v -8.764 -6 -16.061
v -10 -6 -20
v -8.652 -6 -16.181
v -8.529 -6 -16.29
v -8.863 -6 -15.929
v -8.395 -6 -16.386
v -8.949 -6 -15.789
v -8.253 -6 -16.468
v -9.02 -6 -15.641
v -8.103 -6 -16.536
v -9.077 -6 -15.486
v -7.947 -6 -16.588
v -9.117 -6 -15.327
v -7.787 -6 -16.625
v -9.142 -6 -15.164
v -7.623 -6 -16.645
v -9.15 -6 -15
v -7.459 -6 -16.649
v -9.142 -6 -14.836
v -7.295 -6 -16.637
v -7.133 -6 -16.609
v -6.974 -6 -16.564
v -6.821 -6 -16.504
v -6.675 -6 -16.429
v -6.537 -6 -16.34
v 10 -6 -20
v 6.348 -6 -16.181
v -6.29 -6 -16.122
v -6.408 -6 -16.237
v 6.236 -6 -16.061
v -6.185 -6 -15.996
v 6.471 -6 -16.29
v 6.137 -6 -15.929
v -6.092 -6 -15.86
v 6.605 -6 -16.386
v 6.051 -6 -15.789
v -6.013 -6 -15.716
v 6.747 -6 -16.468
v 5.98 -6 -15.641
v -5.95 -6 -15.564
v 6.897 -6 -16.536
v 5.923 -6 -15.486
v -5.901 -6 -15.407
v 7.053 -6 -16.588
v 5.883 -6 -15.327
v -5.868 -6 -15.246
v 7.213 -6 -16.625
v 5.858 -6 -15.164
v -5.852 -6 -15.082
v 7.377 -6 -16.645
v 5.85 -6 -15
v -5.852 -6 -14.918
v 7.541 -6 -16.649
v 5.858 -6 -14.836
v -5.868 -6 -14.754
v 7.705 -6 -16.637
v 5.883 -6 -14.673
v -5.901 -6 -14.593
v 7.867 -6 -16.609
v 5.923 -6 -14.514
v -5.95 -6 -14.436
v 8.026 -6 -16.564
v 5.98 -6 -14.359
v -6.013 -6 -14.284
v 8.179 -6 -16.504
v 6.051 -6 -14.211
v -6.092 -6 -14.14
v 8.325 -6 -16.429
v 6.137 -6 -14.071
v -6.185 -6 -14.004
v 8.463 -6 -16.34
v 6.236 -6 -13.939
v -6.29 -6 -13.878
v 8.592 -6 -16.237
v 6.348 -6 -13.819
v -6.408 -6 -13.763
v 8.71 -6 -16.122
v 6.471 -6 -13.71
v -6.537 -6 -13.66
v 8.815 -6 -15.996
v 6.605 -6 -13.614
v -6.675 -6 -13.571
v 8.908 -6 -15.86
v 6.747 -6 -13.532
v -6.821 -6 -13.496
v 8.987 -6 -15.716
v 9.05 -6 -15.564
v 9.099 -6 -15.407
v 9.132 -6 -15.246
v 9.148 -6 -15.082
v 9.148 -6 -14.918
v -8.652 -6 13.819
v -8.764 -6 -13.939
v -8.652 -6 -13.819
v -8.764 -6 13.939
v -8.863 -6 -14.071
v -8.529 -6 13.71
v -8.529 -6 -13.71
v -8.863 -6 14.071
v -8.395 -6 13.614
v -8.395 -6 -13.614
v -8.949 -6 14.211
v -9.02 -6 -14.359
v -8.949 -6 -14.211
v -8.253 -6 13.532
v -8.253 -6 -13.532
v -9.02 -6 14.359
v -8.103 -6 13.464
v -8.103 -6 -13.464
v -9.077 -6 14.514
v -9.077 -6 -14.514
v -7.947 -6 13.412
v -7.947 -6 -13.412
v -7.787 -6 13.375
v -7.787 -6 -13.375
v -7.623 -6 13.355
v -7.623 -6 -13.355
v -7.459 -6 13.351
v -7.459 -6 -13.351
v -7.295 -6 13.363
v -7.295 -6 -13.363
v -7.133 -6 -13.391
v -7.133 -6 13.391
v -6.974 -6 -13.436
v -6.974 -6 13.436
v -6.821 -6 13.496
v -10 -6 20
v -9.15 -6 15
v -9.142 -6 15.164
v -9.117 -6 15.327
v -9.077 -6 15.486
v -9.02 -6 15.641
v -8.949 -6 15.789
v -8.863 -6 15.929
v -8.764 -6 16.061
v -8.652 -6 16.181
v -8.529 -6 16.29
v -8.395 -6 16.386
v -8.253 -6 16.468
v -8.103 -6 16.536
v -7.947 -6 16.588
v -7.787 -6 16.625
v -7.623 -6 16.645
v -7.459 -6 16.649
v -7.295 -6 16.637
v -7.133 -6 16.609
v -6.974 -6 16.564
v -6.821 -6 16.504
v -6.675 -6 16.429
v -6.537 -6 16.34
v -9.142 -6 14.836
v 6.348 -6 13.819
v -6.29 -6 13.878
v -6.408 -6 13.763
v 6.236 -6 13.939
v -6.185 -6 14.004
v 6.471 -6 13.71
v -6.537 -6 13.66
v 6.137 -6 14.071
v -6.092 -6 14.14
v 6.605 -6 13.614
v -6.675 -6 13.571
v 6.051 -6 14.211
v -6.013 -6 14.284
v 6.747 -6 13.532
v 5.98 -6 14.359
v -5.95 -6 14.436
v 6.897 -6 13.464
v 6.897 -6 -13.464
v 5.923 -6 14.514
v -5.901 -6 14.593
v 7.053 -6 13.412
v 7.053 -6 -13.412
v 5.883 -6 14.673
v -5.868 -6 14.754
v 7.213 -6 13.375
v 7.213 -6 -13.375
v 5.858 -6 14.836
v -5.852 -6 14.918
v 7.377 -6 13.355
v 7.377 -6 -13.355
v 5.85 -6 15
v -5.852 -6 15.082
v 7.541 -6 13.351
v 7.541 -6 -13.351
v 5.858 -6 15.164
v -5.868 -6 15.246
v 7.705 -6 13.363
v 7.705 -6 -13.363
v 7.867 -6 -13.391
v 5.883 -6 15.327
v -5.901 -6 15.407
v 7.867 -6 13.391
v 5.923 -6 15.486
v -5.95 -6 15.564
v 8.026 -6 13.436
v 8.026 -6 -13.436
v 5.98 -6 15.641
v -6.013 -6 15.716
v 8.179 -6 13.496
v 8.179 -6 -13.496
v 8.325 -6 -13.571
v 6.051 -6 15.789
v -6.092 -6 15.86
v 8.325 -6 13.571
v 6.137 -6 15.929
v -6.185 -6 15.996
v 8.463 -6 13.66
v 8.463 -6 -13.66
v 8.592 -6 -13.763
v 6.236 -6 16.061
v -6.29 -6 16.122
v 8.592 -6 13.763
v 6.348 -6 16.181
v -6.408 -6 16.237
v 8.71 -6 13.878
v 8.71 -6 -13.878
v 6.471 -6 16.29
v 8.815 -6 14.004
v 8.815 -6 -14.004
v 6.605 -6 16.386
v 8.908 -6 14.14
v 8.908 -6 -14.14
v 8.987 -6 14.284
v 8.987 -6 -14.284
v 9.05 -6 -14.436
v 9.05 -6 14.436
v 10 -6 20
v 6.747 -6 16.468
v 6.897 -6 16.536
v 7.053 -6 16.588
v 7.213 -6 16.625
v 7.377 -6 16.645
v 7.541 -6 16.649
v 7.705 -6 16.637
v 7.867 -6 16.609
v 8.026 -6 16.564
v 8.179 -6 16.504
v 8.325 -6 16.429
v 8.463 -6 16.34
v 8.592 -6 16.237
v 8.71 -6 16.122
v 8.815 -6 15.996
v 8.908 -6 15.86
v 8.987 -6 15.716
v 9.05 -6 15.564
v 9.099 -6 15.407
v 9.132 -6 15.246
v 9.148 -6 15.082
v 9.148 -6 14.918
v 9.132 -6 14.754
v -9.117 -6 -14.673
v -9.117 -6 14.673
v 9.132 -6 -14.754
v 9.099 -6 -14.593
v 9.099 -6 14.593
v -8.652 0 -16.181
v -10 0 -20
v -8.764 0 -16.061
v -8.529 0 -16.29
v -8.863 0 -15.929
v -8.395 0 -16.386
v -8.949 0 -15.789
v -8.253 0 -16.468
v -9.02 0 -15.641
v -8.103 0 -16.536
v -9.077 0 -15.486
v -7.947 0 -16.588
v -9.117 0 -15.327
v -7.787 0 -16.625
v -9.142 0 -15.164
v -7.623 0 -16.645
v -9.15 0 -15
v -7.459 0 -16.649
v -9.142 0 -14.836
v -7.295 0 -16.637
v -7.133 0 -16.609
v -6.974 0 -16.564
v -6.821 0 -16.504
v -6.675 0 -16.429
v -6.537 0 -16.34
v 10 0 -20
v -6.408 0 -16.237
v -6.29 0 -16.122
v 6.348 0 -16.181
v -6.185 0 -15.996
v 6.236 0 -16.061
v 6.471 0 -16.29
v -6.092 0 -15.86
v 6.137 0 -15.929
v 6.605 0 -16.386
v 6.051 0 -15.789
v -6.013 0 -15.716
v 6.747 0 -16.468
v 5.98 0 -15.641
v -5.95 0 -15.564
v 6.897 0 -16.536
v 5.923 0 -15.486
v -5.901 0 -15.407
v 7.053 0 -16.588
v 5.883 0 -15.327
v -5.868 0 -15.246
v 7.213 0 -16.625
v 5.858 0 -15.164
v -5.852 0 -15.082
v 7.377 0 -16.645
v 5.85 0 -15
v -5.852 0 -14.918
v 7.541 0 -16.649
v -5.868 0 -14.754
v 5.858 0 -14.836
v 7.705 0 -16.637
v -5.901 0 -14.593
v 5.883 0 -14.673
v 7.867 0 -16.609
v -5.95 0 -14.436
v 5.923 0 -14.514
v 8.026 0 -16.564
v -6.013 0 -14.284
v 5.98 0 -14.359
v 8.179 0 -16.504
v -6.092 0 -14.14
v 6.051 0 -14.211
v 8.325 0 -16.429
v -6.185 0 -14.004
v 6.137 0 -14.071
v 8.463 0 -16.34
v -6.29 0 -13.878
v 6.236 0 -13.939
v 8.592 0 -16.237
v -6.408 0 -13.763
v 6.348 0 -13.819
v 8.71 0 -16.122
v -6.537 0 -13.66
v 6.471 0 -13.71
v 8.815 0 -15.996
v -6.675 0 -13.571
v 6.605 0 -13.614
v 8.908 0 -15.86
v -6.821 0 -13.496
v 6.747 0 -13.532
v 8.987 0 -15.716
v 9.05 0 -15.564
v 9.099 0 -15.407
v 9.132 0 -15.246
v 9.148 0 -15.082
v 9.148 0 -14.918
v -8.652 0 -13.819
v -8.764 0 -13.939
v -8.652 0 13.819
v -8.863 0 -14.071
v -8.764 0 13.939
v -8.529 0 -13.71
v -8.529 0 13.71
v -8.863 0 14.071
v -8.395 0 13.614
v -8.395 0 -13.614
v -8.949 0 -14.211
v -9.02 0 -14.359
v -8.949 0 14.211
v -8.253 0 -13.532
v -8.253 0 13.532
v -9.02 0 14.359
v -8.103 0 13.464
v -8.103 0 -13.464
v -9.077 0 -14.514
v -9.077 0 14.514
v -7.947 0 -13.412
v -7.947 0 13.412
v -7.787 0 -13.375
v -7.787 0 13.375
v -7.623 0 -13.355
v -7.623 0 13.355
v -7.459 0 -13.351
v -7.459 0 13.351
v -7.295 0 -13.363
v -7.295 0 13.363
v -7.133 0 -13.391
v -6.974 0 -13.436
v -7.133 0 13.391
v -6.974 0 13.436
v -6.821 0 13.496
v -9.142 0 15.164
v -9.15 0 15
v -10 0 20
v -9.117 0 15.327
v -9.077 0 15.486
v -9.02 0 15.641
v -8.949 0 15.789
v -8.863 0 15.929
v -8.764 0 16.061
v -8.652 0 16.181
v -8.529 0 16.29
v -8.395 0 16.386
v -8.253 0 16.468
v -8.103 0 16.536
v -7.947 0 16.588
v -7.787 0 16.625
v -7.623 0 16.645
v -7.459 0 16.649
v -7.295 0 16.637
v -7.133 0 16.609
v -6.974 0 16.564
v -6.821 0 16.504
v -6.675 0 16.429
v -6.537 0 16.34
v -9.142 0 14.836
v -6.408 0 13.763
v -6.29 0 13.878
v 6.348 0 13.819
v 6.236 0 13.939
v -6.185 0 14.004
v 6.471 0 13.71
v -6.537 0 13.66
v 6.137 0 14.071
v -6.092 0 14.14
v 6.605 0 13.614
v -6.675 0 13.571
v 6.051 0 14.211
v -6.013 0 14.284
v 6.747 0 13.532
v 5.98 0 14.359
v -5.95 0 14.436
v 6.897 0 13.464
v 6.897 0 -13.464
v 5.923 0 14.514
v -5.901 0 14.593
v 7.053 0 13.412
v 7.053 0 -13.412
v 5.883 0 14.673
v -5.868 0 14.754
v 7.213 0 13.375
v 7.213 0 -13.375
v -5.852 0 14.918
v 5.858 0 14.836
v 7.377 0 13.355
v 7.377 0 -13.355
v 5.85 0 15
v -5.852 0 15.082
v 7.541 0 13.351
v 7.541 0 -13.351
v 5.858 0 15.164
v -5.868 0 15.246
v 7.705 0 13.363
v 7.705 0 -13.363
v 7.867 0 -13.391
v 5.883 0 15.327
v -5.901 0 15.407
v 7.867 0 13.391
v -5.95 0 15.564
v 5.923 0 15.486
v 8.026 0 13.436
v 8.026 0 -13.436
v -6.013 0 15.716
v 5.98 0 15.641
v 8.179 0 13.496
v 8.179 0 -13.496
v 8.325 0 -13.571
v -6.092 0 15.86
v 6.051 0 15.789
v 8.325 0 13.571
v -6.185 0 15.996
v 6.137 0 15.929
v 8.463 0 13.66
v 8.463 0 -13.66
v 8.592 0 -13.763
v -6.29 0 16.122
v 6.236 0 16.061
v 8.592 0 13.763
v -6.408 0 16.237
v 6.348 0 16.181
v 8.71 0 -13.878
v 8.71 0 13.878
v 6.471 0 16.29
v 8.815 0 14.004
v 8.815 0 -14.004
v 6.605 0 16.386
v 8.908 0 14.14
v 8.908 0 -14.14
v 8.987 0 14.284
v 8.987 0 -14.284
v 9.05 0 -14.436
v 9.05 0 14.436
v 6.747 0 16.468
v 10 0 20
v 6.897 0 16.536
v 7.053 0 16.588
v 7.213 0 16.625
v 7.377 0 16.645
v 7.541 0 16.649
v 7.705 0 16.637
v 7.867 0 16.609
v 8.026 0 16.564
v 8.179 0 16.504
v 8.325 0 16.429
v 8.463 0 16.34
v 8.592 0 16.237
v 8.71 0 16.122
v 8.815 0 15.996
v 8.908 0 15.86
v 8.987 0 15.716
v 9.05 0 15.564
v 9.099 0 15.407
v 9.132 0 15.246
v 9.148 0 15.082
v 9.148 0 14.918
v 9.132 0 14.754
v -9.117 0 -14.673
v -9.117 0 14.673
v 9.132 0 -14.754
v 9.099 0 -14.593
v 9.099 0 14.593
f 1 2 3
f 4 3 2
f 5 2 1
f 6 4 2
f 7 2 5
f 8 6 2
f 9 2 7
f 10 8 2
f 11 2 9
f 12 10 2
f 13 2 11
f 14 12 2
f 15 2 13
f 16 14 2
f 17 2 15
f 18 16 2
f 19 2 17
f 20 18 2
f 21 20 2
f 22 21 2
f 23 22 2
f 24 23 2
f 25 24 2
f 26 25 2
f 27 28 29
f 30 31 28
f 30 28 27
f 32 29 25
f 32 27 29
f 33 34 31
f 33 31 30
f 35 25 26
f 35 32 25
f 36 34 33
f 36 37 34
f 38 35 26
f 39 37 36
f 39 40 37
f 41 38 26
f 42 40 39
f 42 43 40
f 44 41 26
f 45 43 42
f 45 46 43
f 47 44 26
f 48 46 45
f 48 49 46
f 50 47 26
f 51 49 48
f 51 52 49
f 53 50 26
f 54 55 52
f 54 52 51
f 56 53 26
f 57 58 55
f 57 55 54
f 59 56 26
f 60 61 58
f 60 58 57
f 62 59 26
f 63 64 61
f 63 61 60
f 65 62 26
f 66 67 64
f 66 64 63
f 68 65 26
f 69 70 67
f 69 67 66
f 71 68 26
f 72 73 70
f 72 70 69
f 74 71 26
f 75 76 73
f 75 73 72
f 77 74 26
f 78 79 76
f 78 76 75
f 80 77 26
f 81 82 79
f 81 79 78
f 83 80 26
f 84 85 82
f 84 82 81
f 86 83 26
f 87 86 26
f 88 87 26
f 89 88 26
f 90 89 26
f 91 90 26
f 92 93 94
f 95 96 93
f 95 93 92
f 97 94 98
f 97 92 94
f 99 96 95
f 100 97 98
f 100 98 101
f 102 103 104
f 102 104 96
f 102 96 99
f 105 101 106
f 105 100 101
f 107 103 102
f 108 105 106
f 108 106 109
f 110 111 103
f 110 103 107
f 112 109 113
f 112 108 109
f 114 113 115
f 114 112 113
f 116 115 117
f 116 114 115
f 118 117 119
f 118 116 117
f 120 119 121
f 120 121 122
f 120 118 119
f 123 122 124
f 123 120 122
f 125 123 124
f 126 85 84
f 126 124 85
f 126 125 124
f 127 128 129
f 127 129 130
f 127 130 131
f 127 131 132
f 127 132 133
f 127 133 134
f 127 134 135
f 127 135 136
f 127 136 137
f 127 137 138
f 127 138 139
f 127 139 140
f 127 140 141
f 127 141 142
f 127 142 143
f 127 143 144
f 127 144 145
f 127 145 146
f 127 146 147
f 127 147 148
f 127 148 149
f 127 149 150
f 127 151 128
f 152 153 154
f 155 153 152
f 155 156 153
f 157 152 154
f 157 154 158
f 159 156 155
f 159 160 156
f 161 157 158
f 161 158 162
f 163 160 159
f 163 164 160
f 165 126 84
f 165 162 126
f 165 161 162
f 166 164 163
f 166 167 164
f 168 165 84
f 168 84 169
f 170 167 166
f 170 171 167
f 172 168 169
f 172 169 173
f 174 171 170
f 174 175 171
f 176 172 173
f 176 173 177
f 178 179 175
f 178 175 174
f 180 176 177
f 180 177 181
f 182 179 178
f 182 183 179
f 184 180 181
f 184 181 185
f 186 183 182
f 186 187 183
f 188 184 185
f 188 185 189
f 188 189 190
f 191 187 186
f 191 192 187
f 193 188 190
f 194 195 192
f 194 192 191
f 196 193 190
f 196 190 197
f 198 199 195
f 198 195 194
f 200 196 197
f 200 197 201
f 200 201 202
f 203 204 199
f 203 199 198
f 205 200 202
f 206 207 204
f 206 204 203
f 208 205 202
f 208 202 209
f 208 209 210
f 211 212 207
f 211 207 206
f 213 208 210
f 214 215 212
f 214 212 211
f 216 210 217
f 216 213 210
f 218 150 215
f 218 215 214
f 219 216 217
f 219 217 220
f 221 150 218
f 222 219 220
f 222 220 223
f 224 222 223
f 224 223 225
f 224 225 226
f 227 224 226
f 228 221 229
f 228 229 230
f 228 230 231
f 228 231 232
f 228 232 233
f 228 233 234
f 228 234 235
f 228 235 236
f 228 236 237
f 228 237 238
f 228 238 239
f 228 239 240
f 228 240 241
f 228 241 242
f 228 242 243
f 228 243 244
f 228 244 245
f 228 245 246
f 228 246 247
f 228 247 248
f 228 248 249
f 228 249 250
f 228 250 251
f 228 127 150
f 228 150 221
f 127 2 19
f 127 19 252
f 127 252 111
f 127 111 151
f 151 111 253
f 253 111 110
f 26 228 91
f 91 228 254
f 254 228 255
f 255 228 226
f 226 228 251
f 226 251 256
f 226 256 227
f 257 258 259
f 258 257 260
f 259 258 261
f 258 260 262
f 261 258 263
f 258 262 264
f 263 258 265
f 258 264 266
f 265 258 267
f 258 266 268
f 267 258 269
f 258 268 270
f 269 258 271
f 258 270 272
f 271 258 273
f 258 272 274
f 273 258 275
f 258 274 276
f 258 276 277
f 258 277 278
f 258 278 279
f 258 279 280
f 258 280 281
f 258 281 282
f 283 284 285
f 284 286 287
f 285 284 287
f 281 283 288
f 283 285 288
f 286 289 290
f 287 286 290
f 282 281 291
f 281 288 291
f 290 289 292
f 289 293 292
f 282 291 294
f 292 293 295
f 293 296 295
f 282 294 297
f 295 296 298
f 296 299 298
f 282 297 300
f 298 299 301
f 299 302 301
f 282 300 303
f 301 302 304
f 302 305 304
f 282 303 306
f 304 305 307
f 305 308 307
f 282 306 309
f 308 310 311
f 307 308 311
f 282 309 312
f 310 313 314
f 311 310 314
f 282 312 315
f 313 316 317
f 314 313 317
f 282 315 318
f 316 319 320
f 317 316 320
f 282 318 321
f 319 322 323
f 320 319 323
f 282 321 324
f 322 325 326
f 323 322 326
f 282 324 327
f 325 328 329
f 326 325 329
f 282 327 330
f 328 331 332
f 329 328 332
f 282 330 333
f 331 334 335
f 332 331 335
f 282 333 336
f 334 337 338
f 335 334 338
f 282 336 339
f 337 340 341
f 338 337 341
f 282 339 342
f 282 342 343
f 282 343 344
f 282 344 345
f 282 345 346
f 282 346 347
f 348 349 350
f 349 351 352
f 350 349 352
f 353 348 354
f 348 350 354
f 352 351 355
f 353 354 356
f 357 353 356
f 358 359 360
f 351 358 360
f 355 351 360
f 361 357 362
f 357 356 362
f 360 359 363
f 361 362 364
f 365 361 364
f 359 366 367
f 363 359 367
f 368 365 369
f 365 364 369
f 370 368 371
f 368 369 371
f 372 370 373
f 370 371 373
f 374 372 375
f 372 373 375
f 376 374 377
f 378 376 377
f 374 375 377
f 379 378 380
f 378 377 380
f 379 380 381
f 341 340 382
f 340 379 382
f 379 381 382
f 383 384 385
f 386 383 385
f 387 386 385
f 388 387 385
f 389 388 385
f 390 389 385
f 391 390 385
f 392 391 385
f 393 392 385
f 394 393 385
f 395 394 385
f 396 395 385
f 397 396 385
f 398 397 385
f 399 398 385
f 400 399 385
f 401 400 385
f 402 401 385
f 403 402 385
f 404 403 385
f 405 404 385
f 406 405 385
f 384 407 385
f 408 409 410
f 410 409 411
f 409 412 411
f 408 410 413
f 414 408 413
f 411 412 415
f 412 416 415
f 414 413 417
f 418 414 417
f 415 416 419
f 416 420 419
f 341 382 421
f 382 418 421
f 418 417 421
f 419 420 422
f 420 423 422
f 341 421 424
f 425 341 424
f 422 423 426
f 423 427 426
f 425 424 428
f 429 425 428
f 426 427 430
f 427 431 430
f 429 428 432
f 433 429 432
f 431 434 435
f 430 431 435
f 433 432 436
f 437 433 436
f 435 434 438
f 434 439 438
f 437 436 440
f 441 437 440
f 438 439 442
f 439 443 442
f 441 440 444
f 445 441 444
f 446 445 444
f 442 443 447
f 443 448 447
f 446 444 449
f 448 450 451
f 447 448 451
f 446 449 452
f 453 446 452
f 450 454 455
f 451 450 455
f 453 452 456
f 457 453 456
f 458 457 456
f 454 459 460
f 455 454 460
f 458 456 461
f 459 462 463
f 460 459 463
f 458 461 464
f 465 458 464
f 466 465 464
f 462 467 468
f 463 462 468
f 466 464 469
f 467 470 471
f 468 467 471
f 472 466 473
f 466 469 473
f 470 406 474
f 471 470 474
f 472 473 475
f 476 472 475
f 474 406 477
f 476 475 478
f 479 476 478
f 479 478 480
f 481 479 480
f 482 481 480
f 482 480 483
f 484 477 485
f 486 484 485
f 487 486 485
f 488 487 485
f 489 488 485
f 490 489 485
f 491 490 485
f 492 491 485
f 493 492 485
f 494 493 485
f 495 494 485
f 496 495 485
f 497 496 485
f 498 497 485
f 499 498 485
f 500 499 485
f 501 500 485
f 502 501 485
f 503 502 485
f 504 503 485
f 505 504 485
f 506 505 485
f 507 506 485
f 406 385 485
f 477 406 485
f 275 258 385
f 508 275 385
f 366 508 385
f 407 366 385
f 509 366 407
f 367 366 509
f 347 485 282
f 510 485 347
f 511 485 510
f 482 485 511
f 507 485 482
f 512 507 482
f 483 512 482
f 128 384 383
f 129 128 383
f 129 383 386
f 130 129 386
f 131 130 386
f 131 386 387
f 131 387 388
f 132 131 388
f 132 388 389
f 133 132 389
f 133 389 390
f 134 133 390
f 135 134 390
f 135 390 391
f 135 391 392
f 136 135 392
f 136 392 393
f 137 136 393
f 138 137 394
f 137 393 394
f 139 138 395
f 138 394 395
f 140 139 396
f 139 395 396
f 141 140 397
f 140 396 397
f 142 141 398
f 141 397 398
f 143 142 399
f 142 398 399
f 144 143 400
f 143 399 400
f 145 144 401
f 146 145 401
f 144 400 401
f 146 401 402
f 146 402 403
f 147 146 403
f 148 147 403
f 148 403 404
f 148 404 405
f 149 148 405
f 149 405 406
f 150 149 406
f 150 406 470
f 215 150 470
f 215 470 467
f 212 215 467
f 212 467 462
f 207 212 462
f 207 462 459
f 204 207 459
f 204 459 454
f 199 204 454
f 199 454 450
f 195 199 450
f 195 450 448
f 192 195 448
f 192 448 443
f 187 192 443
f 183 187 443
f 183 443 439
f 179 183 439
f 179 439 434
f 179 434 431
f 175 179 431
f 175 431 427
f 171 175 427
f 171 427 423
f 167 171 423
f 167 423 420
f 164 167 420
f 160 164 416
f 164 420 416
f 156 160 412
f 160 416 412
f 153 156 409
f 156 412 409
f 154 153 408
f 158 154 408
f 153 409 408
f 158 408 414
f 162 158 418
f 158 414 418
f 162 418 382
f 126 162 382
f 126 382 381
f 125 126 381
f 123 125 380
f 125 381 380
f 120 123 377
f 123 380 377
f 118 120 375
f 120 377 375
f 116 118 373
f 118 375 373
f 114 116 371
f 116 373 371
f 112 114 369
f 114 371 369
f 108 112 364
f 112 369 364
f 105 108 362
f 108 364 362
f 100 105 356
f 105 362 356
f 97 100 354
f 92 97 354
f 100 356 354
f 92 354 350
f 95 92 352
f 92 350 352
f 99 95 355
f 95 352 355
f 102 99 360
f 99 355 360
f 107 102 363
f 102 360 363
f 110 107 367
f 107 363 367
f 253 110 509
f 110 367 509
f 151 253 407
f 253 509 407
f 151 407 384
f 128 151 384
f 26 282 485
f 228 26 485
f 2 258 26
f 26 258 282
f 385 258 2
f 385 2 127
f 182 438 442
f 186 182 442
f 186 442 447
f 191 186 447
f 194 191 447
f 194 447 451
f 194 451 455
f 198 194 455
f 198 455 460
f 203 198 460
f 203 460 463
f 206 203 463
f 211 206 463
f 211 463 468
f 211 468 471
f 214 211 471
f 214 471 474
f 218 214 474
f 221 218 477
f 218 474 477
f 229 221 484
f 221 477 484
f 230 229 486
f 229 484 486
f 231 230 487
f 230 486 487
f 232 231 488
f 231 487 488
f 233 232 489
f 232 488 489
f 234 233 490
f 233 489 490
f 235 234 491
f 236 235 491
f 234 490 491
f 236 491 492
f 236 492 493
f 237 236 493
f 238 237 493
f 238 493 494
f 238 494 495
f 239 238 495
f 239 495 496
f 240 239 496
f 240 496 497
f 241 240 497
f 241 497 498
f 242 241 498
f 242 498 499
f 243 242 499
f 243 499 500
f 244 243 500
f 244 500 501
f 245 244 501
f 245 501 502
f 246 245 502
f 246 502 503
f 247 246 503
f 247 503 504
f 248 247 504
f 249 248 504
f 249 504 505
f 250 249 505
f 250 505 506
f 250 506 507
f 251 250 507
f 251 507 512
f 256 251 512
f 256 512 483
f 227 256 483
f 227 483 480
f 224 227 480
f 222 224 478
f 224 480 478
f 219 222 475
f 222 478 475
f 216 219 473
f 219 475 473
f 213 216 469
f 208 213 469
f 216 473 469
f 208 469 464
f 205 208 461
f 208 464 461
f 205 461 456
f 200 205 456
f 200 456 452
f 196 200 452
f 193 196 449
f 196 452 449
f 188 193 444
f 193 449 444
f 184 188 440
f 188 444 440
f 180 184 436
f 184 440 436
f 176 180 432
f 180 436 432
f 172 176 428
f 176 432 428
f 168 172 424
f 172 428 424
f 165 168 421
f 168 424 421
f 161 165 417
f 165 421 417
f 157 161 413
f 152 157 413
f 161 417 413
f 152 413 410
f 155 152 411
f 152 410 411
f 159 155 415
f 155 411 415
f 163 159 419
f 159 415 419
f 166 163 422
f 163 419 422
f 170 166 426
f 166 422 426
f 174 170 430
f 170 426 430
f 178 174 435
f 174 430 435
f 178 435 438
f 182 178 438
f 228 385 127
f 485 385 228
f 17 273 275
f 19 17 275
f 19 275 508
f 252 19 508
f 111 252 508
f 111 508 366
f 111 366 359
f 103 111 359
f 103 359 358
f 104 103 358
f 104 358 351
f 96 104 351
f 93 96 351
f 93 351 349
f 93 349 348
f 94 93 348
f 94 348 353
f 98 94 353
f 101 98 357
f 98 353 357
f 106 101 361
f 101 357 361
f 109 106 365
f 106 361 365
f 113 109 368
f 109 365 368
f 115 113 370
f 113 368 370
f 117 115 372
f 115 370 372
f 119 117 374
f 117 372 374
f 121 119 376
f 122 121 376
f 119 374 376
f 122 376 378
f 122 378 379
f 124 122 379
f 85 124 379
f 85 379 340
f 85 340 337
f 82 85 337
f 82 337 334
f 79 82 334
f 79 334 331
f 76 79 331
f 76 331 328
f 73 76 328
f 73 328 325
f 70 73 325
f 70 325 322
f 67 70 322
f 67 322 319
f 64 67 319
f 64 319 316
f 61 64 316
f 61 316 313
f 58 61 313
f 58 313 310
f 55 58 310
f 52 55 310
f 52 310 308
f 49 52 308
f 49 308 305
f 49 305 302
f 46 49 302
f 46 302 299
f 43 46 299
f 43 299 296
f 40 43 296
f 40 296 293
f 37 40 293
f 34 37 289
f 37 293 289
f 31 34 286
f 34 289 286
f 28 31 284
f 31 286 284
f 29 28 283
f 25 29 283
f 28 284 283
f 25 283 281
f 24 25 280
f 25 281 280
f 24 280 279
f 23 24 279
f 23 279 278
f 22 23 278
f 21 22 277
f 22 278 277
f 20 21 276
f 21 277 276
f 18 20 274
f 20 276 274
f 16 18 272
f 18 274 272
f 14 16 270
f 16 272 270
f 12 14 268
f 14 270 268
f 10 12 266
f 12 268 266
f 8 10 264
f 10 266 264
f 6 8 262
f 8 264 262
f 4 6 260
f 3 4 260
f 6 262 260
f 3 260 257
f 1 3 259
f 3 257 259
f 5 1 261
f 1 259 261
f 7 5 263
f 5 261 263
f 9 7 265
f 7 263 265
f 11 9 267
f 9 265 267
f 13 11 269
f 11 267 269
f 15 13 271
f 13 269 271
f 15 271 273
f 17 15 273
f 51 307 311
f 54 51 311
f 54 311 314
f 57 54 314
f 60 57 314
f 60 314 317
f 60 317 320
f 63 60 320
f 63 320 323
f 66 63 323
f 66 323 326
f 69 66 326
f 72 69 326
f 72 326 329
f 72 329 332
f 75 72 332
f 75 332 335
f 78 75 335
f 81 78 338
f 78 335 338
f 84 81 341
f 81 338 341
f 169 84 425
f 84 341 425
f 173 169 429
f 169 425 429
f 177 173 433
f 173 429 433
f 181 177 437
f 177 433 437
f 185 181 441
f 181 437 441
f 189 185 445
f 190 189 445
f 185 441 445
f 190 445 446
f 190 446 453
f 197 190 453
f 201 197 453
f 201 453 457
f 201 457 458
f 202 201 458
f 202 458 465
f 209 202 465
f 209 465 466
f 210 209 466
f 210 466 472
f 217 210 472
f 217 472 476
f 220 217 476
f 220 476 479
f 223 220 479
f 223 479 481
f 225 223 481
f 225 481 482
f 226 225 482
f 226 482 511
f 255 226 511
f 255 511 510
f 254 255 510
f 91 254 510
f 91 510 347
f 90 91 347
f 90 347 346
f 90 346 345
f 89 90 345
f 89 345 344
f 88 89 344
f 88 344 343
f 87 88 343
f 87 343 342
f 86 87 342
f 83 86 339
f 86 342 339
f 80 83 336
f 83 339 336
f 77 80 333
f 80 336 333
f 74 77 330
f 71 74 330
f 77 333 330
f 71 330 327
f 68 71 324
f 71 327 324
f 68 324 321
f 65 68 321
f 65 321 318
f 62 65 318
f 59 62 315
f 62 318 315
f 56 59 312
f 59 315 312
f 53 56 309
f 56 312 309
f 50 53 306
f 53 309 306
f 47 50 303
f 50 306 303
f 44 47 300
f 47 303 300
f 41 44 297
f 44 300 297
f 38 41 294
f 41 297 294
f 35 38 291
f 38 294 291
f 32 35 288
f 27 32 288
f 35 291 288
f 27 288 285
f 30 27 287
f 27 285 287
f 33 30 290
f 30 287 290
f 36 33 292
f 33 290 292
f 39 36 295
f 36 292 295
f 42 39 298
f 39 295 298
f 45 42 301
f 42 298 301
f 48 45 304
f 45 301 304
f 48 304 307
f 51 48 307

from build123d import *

# Parameters (mm, degrees)
F0_W     = 20
F0_H     = 40
F1_DEPTH = 6
F3_D     = 3.3
F3_DEPTH = 10
F3_TIP   = 0.9914200214


with BuildPart() as f1:
    # F0 (on Front) → F1 (new body)
    with BuildSketch(Plane.XZ):
        Rectangle(F0_W, F0_H)
    extrude(amount=F1_DEPTH)

    # F3
    with Locations(Plane.XZ.offset(6)):
        with Locations((-7.5, 15), (7.5, 15), (7.5, -15), (-7.5, -15)):
            Hole(F3_D / 2, depth=F3_DEPTH)
            with Locations((0, 0, -(F3_DEPTH + F3_TIP / 2))):  # 118° drill point
                Cone(0, F3_D / 2, F3_TIP, mode=Mode.SUBTRACT)


solid = f1.part
